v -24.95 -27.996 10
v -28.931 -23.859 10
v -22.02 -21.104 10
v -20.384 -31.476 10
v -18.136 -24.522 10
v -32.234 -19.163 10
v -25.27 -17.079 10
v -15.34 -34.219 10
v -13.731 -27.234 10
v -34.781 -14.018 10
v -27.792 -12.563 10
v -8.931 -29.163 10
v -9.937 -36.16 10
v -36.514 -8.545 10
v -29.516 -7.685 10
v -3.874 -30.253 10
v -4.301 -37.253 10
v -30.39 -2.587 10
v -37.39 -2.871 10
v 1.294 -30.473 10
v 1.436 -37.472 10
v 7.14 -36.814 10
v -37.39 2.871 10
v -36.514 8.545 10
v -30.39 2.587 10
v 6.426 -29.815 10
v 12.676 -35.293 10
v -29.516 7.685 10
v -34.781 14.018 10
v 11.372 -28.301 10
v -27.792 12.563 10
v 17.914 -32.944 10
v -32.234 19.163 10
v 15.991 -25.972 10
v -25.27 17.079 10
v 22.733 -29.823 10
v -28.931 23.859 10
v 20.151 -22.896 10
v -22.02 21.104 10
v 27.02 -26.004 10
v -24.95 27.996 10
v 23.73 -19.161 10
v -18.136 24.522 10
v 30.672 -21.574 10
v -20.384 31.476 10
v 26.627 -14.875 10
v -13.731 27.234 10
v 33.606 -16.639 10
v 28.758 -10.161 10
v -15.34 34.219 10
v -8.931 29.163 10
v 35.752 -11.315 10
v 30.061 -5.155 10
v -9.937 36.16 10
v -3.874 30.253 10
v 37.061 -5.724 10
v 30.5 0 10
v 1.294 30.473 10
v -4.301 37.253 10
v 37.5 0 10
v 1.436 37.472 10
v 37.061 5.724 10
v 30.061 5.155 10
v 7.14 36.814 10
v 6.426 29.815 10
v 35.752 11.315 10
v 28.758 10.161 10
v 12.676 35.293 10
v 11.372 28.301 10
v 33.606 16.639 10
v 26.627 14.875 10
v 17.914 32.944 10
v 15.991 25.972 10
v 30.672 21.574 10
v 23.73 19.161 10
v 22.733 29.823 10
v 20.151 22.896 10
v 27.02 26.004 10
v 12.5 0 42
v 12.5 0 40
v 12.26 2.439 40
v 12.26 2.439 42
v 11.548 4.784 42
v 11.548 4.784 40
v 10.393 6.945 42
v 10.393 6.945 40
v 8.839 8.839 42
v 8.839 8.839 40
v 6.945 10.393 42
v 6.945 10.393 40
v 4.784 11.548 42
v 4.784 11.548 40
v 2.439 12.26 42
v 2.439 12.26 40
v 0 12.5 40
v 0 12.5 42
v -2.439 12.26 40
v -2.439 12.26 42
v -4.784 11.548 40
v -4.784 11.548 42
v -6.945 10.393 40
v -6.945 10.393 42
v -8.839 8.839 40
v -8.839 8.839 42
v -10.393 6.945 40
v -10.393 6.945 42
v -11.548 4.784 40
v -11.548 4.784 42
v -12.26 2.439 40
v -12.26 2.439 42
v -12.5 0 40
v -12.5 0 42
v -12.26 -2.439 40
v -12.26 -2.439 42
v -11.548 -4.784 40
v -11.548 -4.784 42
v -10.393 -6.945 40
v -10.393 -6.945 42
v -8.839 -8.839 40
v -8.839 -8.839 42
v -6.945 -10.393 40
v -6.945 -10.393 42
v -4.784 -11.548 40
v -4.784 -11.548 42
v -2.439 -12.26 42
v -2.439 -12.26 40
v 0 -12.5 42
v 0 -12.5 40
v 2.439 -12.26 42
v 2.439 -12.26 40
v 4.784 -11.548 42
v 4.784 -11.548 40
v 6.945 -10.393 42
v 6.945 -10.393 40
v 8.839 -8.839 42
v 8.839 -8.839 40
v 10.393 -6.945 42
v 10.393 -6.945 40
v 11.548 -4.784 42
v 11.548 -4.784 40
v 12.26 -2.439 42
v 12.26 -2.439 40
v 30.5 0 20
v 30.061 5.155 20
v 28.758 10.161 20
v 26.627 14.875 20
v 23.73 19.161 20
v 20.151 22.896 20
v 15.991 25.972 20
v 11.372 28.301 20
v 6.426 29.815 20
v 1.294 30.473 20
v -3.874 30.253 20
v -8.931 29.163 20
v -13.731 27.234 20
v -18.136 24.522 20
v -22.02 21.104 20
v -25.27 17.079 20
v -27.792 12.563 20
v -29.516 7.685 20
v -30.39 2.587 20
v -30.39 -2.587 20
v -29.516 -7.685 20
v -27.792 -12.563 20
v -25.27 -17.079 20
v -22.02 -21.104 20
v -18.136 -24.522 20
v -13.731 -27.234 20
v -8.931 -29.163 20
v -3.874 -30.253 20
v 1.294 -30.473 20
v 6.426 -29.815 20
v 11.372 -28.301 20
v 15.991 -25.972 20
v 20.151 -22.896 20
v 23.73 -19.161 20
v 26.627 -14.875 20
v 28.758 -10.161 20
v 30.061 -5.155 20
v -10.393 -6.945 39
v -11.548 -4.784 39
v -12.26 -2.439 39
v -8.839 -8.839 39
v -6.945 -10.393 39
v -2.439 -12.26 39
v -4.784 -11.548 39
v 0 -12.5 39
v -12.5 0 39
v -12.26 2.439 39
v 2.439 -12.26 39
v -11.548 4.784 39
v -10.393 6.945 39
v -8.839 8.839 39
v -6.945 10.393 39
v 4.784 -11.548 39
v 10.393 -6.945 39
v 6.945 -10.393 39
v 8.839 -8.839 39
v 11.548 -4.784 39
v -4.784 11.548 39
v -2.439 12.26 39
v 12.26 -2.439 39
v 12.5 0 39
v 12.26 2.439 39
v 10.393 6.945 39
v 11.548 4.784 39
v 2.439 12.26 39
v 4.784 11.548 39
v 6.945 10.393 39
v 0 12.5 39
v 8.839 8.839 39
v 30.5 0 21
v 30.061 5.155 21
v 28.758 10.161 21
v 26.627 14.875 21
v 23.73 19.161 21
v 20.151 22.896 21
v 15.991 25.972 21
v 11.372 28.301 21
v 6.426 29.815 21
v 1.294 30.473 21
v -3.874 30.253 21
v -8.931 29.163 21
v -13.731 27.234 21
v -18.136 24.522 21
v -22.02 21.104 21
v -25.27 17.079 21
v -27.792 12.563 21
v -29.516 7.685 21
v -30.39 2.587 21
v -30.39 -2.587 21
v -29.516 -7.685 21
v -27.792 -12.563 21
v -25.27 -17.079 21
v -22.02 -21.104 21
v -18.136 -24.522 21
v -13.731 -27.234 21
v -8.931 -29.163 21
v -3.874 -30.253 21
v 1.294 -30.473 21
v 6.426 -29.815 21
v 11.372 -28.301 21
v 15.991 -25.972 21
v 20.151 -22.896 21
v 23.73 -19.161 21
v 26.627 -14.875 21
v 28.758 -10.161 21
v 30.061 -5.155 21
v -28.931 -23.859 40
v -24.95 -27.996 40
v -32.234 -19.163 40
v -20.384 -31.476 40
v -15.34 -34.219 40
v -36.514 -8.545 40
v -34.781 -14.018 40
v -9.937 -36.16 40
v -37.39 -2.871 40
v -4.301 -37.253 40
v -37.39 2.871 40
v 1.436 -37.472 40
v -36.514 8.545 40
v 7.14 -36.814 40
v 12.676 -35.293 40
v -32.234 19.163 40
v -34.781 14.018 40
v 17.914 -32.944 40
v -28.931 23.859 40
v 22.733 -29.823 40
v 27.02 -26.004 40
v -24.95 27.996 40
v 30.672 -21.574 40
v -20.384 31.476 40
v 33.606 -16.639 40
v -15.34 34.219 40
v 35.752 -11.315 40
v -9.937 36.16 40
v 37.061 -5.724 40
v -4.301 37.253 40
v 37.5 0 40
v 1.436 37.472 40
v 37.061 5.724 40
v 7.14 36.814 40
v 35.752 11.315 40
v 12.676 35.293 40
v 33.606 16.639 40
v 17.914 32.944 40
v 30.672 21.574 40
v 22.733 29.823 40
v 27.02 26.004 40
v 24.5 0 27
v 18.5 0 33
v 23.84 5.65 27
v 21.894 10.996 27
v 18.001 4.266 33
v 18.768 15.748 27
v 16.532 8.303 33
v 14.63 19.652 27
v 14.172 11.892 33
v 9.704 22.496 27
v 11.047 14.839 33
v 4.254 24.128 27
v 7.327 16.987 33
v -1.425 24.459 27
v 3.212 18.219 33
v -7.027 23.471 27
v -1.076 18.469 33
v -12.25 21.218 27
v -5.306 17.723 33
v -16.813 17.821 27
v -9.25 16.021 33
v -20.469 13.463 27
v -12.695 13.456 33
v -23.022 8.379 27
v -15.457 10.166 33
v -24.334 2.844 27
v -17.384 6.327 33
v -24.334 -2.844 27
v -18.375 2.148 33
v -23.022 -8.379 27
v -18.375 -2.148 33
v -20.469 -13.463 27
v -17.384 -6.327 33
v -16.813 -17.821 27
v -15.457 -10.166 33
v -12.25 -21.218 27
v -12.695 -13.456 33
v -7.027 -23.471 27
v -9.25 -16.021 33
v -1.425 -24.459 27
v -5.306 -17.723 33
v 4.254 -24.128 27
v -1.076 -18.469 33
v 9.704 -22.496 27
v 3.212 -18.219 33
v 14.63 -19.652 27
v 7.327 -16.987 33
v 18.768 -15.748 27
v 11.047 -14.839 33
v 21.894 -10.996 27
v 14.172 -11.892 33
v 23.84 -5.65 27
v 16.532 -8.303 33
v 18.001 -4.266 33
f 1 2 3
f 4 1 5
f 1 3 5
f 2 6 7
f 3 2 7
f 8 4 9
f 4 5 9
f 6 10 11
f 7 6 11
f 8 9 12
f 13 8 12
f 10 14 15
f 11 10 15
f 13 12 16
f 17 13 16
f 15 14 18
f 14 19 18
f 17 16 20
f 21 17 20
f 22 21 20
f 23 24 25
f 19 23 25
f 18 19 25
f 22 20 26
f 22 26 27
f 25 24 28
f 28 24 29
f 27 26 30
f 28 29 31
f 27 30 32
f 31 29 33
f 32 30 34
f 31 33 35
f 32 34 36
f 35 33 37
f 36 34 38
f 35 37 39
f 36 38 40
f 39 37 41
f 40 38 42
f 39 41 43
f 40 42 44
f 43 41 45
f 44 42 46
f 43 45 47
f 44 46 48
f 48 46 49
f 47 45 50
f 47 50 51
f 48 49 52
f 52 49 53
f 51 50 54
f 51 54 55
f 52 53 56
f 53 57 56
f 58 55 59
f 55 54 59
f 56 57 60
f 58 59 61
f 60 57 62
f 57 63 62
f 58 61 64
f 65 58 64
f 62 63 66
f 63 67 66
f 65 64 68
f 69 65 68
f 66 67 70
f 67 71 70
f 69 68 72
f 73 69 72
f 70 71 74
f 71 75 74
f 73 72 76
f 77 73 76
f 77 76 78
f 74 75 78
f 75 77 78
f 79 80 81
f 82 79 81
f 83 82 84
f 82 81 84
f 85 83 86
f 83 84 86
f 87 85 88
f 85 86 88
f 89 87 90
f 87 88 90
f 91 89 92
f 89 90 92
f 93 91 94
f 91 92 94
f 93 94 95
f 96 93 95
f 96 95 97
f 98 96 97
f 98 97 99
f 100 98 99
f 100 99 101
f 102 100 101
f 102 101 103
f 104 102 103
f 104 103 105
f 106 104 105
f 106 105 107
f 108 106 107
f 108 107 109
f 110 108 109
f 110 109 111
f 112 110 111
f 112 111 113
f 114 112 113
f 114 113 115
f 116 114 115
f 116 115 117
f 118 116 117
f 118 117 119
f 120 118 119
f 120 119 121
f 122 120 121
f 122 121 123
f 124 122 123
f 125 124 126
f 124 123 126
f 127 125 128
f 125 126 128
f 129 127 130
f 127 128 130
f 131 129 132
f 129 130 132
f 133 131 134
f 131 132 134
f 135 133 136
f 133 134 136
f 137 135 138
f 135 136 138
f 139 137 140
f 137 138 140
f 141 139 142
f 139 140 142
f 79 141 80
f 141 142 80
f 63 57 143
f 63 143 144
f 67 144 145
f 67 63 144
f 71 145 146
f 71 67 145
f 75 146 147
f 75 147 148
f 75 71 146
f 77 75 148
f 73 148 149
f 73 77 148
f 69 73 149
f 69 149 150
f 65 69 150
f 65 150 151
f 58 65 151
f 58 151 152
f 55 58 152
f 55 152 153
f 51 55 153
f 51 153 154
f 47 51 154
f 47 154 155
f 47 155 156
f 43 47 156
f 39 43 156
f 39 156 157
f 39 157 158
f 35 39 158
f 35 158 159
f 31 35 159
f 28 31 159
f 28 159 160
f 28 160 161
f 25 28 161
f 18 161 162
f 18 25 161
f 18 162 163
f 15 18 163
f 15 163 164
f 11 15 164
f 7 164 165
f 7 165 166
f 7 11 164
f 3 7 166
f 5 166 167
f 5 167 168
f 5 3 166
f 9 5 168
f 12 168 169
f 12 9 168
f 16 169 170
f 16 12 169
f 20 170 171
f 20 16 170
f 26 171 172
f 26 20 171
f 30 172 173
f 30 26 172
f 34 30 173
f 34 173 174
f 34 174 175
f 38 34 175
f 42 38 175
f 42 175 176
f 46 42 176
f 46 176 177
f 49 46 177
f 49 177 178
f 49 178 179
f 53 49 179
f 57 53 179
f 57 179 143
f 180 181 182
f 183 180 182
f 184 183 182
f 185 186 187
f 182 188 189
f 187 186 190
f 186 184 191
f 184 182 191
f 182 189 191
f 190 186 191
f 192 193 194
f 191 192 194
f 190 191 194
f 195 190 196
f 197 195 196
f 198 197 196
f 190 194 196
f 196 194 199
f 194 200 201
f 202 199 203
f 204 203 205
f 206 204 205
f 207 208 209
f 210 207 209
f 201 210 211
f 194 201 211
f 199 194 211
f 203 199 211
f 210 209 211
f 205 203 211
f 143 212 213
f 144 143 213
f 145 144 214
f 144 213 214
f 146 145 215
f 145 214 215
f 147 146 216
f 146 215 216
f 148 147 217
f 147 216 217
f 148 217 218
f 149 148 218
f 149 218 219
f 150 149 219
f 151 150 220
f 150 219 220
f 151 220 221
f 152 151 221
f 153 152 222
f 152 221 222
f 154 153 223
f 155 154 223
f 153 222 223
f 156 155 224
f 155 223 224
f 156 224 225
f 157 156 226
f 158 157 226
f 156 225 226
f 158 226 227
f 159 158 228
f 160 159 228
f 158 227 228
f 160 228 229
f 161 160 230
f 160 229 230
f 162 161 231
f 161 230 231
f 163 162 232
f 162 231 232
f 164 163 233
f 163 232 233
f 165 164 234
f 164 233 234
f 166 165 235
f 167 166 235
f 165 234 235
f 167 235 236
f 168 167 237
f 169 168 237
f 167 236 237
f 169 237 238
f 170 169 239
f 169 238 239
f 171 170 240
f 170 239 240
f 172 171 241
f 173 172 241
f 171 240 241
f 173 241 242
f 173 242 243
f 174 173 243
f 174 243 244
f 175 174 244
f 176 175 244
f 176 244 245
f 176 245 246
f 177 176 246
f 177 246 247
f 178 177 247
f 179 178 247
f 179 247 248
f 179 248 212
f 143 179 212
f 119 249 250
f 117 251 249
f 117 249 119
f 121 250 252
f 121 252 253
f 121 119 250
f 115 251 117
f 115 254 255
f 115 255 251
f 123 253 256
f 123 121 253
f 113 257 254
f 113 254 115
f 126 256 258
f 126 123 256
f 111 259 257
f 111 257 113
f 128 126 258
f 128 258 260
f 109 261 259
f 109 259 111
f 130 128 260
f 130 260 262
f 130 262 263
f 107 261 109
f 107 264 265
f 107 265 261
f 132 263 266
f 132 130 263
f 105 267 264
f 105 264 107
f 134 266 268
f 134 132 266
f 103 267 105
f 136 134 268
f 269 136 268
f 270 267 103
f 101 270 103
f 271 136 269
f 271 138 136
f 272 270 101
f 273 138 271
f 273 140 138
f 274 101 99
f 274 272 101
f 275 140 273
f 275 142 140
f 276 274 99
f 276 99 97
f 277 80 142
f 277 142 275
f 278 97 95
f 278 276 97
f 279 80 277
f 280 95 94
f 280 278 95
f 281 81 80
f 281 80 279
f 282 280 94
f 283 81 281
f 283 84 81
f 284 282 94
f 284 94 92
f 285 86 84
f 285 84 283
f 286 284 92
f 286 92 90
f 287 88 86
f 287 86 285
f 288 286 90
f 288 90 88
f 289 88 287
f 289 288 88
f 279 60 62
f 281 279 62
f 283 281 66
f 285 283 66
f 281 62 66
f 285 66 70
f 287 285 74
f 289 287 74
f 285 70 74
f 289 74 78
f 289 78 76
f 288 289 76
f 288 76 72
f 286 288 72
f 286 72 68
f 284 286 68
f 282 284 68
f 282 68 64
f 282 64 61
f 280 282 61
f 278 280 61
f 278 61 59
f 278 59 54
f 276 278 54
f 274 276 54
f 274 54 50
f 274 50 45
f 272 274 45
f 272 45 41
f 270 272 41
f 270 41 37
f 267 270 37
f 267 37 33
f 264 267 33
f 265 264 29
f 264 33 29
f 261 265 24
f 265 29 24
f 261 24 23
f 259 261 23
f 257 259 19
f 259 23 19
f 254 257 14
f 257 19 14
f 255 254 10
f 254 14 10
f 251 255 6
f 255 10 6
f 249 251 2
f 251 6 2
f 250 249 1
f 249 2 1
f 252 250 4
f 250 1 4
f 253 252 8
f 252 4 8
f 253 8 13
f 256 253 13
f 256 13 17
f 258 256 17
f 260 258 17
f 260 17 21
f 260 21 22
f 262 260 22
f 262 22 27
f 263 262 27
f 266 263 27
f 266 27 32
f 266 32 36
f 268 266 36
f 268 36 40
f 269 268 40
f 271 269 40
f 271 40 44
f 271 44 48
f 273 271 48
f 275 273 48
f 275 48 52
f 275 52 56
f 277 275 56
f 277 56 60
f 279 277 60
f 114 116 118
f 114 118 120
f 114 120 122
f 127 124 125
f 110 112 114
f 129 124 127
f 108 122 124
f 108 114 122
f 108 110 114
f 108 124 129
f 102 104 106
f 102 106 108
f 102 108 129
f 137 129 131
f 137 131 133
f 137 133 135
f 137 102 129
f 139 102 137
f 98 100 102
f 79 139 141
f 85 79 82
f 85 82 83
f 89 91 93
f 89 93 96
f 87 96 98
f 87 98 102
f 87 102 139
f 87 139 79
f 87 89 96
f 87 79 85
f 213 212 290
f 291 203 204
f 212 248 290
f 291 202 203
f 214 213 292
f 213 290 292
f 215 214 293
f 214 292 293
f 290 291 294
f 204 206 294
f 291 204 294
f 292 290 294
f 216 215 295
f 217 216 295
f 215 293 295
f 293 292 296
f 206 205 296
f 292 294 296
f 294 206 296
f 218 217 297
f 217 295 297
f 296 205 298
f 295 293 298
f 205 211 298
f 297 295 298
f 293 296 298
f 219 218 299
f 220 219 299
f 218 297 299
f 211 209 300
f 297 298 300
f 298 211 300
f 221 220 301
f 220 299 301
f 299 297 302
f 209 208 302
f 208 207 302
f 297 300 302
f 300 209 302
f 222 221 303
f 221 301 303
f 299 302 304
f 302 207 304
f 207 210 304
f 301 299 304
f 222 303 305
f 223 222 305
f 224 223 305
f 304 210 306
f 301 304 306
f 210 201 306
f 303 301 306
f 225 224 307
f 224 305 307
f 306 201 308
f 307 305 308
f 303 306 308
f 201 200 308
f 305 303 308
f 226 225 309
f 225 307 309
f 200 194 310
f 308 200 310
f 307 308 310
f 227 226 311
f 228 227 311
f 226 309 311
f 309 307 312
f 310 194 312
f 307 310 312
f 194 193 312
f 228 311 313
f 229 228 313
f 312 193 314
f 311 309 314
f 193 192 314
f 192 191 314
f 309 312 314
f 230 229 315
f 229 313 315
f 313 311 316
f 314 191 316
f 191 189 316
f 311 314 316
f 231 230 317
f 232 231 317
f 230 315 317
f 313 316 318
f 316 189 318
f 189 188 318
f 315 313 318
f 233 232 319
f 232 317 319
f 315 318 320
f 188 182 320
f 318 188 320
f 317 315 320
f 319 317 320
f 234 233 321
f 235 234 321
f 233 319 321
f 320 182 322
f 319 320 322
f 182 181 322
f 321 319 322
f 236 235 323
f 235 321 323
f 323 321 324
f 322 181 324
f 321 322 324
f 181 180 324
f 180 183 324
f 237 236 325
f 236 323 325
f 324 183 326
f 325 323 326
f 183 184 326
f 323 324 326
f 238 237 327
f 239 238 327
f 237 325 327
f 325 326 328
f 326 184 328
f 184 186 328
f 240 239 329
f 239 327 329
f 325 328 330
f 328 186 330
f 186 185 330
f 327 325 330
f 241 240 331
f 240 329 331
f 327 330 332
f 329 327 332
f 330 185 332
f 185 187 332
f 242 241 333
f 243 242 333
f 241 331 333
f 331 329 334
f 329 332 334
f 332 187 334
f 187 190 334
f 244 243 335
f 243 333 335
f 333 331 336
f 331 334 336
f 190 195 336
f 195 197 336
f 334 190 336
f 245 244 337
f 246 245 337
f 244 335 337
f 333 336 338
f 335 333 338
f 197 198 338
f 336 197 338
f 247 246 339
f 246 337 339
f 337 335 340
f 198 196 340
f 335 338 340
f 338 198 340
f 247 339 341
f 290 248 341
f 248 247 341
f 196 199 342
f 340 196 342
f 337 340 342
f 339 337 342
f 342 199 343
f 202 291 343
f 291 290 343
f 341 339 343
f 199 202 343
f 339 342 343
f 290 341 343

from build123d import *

# Parameters (mm, degrees)
F0_R        = 37.5
F0_R_2      = 30.5
F1_DEPTH    = 40
F2_START    = 20
F0_R_3      = 12.5
F2_DEPTH    = 20
F3_START    = 39
F3_DEPTH    = 3
F4_S5_R     = 30.5
F4_T6_DEPTH = 47
F5_DEPTH    = 10


# Not quite as in the source:
# - a fillet or chamfer that OpenCascade refuses, or shapes differently, is made with other operations: its cross-section is extruded or revolved along the edge and cut away or added


with BuildPart() as f1:
    # F0 (on Top) → F1 (new body)
    with BuildSketch(Plane.XY):
        Circle(F0_R)
        Circle(F0_R_2, mode=Mode.SUBTRACT)
    extrude(amount=F1_DEPTH)

    # F0 (on Top) → F2 (join)
    with BuildSketch(Plane.XY.offset(F2_START)):
        Circle(F0_R_2)
        Circle(F0_R_3, mode=Mode.SUBTRACT)
    extrude(amount=F2_DEPTH)

    # F0 (on Top) → F3 (join)
    with BuildSketch(Plane.XY.offset(F3_START)):
        Circle(F0_R_3)
    extrude(amount=F3_DEPTH)

    # F4: chamfer of 19 on 1 edges, made by hand


with BuildPart() as f4_tool2:
    # F4_s3 → F4_t4 (revolve)
    with BuildSketch(Plane.XZ):
        Polygon((31.5, 20), (12.5, 39), (12.5, 20), align=None)
    revolve(axis=Axis((0, 0, 20), (0, 0, 1)))

    # F4_s5 → F4_t6 (intersect, symmetric)
    with BuildSketch(Plane.XY.offset(29.5)):
        Circle(F4_S5_R)
    extrude(amount=F4_T6_DEPTH, both=True, mode=Mode.INTERSECT)

    split(bisect_by=Plane.XY.offset(39), keep=Keep.BOTTOM)


with BuildPart() as f1_1:
    add(f1.part)

    # F4_t1: cut F4_tool2
    add(f4_tool2.part, mode=Mode.SUBTRACT)

    # F5 (cut): a face of the model
    f5_faces = [f1_1.faces().sort_by_distance(p)[0] for p in [
        (-36.4393398282, 0, 0),
    ]]
    extrude(f5_faces, amount=-F5_DEPTH, mode=Mode.SUBTRACT)


solid = f1_1.part
